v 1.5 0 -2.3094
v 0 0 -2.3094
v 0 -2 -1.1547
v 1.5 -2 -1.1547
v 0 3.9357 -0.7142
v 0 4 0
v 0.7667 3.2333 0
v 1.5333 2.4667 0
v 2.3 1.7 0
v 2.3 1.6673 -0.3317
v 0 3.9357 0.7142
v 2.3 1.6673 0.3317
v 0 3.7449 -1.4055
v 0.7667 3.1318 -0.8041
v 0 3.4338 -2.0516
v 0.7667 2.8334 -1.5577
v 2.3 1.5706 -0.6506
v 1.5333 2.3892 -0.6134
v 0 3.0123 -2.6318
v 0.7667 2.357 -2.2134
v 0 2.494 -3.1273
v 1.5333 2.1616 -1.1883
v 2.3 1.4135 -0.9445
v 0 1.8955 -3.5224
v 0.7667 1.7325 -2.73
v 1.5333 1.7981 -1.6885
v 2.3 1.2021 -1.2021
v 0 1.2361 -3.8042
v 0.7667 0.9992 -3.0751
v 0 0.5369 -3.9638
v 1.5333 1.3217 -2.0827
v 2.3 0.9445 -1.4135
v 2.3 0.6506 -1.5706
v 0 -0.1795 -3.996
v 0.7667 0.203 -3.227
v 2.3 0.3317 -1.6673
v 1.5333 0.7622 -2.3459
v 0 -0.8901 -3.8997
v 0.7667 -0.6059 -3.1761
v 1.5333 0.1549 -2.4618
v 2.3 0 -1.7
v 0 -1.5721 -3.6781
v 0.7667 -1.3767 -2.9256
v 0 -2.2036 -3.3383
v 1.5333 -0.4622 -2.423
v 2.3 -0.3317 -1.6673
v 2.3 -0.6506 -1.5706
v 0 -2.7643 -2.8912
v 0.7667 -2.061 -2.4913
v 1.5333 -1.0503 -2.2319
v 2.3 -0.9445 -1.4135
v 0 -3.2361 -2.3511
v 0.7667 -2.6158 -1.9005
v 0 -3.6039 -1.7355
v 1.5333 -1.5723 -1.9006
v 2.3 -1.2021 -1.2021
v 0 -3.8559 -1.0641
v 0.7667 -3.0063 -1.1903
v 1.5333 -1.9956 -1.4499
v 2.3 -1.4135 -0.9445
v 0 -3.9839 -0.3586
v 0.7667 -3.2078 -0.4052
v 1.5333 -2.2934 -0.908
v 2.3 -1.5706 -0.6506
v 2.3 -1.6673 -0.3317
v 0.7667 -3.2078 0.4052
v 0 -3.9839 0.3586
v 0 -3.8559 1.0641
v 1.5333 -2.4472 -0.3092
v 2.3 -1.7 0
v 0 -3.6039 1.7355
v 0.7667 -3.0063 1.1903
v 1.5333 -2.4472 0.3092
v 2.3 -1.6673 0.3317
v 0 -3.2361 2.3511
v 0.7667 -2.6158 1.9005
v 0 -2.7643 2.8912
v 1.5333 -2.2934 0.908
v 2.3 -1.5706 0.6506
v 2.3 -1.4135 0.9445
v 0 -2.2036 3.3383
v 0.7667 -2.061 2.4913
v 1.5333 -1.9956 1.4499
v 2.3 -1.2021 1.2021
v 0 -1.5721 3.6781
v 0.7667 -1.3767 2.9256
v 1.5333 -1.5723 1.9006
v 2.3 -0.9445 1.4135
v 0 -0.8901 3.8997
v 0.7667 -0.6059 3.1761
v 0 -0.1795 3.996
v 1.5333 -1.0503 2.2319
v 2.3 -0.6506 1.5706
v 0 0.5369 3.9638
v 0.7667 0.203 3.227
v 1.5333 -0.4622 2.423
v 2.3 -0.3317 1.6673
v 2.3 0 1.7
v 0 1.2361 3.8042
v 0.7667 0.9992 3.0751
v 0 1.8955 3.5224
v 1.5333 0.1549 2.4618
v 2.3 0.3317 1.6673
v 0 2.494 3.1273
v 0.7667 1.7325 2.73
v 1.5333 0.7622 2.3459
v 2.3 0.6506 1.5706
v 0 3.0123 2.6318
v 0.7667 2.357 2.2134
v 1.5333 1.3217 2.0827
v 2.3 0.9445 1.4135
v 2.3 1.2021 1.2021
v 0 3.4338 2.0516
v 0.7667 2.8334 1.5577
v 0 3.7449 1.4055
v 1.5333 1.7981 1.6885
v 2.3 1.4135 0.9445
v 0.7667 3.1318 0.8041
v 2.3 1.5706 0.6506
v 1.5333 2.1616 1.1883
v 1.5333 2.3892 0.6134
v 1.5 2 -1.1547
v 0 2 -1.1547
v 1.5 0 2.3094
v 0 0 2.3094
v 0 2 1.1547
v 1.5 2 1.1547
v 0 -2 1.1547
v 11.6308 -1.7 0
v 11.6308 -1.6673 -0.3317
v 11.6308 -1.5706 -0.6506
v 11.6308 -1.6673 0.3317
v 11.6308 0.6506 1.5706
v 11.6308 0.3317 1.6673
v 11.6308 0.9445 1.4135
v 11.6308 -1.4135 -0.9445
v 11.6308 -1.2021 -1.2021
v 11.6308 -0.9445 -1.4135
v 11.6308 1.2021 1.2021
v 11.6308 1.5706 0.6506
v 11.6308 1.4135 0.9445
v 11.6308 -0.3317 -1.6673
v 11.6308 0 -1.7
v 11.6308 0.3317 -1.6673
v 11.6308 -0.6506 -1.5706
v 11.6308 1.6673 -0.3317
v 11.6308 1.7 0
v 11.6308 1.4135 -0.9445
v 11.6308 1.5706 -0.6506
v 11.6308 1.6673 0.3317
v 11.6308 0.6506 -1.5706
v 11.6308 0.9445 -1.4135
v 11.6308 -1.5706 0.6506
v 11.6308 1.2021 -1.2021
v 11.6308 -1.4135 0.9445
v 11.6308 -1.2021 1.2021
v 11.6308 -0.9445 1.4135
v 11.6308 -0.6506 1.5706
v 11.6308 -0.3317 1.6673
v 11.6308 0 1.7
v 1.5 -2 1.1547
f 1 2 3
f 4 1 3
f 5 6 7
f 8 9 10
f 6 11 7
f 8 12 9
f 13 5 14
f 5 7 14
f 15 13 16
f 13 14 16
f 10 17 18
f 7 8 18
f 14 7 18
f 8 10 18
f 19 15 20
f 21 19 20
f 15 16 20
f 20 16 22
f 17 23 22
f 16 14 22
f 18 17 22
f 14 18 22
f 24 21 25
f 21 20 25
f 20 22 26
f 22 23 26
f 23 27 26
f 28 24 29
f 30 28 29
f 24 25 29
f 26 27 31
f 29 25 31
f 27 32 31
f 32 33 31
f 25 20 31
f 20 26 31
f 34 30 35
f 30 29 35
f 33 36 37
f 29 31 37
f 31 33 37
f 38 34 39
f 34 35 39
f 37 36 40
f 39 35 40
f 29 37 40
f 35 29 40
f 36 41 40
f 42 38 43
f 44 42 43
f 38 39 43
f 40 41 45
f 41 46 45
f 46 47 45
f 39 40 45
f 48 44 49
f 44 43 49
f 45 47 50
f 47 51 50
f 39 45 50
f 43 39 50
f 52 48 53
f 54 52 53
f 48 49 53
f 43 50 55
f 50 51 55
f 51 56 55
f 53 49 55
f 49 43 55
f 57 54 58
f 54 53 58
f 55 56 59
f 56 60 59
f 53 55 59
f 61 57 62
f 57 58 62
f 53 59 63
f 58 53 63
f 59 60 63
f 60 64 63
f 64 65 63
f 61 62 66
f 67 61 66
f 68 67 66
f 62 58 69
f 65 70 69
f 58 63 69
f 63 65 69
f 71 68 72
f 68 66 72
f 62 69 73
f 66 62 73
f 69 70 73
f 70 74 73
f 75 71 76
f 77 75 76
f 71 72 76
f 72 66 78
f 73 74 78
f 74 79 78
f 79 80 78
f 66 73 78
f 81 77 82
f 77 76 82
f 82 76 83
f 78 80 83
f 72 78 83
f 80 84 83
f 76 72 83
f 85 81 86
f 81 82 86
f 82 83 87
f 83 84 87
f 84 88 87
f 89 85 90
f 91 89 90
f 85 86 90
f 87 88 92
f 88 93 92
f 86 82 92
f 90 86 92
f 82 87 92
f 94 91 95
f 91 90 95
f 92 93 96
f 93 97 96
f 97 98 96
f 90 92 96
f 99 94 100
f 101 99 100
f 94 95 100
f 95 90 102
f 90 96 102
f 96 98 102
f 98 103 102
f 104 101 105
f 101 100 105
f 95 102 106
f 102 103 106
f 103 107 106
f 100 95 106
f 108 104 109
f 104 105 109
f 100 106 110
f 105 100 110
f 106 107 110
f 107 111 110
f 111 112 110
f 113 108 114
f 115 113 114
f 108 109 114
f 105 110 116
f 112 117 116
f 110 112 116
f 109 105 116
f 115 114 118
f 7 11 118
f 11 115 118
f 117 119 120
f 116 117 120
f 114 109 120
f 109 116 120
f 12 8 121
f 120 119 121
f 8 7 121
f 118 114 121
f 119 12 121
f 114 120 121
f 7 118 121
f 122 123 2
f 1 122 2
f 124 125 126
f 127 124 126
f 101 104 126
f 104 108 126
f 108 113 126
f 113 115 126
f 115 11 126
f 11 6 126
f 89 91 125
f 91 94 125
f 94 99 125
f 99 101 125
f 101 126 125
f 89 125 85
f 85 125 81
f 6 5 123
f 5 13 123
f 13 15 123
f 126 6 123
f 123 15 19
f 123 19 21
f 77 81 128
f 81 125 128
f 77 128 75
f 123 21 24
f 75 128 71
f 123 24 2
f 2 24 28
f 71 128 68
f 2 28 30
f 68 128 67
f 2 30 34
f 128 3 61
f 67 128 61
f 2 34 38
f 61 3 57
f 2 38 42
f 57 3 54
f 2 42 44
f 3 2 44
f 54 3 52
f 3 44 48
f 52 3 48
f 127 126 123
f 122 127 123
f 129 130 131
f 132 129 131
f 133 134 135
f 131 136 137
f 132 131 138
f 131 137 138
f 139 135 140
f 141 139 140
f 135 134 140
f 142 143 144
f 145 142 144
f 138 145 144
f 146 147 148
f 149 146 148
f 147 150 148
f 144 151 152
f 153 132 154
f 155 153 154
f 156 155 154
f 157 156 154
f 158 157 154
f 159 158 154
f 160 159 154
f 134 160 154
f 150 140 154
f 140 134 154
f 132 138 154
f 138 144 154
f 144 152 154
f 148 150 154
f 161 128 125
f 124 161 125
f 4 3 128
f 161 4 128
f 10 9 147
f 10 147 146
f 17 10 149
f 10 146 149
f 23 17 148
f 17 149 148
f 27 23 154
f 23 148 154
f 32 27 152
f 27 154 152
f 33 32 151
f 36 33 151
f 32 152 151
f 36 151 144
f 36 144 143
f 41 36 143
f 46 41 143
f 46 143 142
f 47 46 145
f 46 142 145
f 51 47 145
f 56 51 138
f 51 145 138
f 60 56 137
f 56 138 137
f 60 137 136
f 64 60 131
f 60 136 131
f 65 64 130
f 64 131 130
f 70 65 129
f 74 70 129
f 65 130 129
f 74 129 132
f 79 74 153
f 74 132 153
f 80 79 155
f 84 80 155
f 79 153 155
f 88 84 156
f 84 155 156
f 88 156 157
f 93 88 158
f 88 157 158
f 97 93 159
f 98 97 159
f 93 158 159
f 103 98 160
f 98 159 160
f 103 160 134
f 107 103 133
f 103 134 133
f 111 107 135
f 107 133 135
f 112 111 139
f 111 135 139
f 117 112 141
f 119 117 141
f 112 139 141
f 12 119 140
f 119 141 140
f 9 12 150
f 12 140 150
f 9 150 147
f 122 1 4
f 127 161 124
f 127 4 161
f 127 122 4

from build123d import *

# Parameters (mm, degrees)
KES_EKSTR_ZYON1_DEPTH = 1.5


with BuildPart() as part:
    # Çizim1 → Döndür1 (revolve)
    with BuildSketch(Plane.XY):
        Polygon((0, 0), (0, 4), (2.3, 1.7), (11.630773557, 1.7), (11.630773557, 0), align=None)
    revolve(axis=Axis((11.630773557, 0, 0), (-1, 0, 0)))

    # Çizim2 → Kes-Ekstrüzyon1 (cut)
    with BuildSketch(Plane.ZY):
        Polygon((1.154700538, -2), (2.309401077, 0), (1.154700538, 2), (-1.154700538, 2), (-2.309401077, 0), (-1.154700538, -2), align=None)
    extrude(amount=-KES_EKSTR_ZYON1_DEPTH, mode=Mode.SUBTRACT)


solid = part.part
